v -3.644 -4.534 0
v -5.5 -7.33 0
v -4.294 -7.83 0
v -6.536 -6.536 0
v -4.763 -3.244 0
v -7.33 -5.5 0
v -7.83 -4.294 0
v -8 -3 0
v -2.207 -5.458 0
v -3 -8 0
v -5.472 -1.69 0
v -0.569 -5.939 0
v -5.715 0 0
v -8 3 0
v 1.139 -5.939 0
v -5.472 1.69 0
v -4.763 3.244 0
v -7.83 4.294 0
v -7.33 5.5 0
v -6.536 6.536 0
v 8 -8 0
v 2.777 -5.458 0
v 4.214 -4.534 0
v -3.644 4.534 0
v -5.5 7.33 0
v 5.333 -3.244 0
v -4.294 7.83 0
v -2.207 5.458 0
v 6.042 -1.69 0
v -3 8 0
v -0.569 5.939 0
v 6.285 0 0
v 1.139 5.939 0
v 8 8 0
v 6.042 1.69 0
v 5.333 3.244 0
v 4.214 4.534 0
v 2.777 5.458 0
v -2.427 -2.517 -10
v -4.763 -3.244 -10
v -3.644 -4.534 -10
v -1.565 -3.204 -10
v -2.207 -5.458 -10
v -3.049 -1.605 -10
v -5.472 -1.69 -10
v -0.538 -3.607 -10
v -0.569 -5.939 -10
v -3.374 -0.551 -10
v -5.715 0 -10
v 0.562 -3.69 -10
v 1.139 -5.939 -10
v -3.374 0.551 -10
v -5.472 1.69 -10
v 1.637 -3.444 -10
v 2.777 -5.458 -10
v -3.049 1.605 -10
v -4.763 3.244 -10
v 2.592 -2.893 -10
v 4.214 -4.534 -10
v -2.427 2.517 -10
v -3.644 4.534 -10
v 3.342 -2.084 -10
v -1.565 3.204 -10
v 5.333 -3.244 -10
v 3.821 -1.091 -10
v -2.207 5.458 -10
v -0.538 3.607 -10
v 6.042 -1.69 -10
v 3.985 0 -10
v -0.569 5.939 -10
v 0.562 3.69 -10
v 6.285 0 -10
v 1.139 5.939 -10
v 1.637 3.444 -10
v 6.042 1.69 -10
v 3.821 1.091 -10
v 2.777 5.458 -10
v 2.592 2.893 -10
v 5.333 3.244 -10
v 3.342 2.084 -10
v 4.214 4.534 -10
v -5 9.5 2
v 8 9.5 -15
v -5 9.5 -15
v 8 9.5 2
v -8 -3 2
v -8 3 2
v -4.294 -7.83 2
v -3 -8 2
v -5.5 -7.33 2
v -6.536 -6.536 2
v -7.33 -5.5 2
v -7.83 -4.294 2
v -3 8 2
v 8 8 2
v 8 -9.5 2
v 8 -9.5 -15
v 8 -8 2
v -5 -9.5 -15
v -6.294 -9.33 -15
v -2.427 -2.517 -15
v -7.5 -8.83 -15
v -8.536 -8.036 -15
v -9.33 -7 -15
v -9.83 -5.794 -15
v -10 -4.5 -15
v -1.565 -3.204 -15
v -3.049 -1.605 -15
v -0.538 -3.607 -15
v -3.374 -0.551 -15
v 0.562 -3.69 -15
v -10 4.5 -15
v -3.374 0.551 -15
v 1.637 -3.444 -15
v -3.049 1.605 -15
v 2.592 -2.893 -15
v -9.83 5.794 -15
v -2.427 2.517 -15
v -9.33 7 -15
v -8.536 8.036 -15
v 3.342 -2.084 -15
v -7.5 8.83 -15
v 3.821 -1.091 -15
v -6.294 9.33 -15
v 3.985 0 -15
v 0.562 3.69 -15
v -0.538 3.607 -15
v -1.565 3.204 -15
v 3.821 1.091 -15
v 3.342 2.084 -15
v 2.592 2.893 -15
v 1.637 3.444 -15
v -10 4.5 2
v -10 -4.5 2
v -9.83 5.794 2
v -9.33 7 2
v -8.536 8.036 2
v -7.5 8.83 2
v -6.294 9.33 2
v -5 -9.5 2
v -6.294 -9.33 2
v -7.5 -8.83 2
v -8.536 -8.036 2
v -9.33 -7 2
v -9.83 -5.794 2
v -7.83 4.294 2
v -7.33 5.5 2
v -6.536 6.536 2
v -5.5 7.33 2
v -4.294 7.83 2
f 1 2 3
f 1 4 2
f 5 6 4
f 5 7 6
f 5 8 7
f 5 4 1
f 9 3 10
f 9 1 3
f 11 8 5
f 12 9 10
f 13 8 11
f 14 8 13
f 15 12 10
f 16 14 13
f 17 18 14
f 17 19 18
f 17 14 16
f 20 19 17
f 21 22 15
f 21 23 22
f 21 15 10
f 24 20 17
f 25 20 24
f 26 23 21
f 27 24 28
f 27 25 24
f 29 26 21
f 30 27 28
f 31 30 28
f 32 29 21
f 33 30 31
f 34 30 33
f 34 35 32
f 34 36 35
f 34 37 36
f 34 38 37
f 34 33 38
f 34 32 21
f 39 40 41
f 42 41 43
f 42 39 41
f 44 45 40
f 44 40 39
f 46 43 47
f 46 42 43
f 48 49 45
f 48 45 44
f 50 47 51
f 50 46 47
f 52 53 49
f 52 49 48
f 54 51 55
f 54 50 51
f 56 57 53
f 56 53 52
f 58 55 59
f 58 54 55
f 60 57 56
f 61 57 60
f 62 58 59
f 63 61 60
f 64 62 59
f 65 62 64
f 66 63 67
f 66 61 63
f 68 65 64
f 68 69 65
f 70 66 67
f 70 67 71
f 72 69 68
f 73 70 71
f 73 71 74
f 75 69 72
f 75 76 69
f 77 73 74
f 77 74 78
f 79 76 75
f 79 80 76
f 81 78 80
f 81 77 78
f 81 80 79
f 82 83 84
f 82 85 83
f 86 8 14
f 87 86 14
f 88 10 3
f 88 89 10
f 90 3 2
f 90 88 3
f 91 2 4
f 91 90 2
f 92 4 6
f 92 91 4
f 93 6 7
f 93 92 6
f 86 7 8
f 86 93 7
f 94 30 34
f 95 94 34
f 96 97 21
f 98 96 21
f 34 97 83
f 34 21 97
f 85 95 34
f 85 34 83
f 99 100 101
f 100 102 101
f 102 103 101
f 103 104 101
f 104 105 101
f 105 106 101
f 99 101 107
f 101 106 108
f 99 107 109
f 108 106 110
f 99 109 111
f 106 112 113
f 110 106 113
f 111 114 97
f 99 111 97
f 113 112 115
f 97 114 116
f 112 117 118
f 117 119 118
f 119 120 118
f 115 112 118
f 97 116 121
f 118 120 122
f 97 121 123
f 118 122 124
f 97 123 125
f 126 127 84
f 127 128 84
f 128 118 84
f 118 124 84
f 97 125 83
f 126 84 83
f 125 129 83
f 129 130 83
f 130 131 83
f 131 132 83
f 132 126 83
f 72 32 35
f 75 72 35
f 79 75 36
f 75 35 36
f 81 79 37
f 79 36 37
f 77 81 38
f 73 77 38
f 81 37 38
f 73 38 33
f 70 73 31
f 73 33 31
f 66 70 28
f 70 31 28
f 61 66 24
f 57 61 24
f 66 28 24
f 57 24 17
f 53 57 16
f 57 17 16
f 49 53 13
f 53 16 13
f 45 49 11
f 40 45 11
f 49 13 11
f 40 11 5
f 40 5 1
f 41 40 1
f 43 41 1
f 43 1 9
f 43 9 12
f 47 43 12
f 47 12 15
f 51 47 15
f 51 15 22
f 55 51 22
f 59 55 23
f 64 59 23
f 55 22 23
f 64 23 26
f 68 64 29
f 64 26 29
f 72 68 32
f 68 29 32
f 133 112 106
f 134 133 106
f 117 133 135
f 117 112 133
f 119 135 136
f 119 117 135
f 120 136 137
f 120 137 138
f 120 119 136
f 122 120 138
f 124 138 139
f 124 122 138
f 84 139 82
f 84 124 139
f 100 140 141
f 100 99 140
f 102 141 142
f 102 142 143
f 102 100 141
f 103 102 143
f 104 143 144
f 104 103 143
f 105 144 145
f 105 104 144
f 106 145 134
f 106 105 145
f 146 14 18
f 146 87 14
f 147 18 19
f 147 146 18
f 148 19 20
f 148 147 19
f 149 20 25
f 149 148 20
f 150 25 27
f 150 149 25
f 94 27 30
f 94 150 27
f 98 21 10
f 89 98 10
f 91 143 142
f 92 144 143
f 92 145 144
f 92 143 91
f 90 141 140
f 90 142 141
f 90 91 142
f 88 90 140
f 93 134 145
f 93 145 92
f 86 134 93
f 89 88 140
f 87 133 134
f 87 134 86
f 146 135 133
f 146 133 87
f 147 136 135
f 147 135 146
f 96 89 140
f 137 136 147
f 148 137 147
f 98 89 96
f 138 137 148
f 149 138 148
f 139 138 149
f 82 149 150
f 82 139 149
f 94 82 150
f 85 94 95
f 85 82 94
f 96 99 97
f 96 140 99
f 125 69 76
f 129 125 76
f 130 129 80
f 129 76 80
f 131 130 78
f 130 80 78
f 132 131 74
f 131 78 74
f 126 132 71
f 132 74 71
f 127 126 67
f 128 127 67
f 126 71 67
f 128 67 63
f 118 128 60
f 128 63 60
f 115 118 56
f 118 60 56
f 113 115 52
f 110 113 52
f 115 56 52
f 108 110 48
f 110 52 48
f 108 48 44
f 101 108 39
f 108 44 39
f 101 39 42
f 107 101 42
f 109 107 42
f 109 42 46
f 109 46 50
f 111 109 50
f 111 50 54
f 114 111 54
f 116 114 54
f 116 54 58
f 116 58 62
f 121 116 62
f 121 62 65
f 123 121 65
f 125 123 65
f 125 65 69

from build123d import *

# Parameters (mm, degrees)
F0_W          = 16
F0_H          = 16
F0_R          = 6
F0_R_2        = 3.7
F1_DEPTH      = 15
F2_DEPTH      = 2
F2_DEPTH_BACK = 15
F3_R          = 5
F4_DEPTH      = 10


with BuildPart() as f1:
    # F0 (on Top) → F1 (new body)
    with BuildSketch(Plane.XY):
        Rectangle(F0_W, F0_H)
        with Locations((0.285, 0)):
            Circle(F0_R, mode=Mode.SUBTRACT)
        with Locations((0.285, 0)):
            Circle(F0_R)
        with Locations((0.285, 0)):
            Circle(F0_R_2, mode=Mode.SUBTRACT)
    extrude(amount=-F1_DEPTH)

    # F0 (on Top) → F2 (join, two sides)
    with BuildSketch(Plane.XY) as f2_sk:
        Polygon((8, -9.5), (8, -8), (-8, -8), (-8, 8), (8, 8), (8, 9.5), (-10, 9.5), (-10, -9.5), align=None)
    extrude(amount=F2_DEPTH)
    extrude(f2_sk.sketch, amount=-F2_DEPTH_BACK)

    # F3
    f3_edges = [f1.edges().sort_by_distance(p)[0] for p in [
        (-8, 8, 1),
        (-8, -8, 1),
        (-10, 9.5, -6.5),
        (-10, -9.5, -6.5),
    ]]
    fillet(f3_edges, radius=F3_R)

    # F0 (on Top) → F4 (cut)
    with BuildSketch(Plane.XY):
        with Locations((0.285, 0)):
            Circle(F0_R)
        with Locations((0.285, 0)):
            Circle(F0_R_2, mode=Mode.SUBTRACT)
    extrude(amount=-F4_DEPTH, mode=Mode.SUBTRACT)


solid = f1.part
